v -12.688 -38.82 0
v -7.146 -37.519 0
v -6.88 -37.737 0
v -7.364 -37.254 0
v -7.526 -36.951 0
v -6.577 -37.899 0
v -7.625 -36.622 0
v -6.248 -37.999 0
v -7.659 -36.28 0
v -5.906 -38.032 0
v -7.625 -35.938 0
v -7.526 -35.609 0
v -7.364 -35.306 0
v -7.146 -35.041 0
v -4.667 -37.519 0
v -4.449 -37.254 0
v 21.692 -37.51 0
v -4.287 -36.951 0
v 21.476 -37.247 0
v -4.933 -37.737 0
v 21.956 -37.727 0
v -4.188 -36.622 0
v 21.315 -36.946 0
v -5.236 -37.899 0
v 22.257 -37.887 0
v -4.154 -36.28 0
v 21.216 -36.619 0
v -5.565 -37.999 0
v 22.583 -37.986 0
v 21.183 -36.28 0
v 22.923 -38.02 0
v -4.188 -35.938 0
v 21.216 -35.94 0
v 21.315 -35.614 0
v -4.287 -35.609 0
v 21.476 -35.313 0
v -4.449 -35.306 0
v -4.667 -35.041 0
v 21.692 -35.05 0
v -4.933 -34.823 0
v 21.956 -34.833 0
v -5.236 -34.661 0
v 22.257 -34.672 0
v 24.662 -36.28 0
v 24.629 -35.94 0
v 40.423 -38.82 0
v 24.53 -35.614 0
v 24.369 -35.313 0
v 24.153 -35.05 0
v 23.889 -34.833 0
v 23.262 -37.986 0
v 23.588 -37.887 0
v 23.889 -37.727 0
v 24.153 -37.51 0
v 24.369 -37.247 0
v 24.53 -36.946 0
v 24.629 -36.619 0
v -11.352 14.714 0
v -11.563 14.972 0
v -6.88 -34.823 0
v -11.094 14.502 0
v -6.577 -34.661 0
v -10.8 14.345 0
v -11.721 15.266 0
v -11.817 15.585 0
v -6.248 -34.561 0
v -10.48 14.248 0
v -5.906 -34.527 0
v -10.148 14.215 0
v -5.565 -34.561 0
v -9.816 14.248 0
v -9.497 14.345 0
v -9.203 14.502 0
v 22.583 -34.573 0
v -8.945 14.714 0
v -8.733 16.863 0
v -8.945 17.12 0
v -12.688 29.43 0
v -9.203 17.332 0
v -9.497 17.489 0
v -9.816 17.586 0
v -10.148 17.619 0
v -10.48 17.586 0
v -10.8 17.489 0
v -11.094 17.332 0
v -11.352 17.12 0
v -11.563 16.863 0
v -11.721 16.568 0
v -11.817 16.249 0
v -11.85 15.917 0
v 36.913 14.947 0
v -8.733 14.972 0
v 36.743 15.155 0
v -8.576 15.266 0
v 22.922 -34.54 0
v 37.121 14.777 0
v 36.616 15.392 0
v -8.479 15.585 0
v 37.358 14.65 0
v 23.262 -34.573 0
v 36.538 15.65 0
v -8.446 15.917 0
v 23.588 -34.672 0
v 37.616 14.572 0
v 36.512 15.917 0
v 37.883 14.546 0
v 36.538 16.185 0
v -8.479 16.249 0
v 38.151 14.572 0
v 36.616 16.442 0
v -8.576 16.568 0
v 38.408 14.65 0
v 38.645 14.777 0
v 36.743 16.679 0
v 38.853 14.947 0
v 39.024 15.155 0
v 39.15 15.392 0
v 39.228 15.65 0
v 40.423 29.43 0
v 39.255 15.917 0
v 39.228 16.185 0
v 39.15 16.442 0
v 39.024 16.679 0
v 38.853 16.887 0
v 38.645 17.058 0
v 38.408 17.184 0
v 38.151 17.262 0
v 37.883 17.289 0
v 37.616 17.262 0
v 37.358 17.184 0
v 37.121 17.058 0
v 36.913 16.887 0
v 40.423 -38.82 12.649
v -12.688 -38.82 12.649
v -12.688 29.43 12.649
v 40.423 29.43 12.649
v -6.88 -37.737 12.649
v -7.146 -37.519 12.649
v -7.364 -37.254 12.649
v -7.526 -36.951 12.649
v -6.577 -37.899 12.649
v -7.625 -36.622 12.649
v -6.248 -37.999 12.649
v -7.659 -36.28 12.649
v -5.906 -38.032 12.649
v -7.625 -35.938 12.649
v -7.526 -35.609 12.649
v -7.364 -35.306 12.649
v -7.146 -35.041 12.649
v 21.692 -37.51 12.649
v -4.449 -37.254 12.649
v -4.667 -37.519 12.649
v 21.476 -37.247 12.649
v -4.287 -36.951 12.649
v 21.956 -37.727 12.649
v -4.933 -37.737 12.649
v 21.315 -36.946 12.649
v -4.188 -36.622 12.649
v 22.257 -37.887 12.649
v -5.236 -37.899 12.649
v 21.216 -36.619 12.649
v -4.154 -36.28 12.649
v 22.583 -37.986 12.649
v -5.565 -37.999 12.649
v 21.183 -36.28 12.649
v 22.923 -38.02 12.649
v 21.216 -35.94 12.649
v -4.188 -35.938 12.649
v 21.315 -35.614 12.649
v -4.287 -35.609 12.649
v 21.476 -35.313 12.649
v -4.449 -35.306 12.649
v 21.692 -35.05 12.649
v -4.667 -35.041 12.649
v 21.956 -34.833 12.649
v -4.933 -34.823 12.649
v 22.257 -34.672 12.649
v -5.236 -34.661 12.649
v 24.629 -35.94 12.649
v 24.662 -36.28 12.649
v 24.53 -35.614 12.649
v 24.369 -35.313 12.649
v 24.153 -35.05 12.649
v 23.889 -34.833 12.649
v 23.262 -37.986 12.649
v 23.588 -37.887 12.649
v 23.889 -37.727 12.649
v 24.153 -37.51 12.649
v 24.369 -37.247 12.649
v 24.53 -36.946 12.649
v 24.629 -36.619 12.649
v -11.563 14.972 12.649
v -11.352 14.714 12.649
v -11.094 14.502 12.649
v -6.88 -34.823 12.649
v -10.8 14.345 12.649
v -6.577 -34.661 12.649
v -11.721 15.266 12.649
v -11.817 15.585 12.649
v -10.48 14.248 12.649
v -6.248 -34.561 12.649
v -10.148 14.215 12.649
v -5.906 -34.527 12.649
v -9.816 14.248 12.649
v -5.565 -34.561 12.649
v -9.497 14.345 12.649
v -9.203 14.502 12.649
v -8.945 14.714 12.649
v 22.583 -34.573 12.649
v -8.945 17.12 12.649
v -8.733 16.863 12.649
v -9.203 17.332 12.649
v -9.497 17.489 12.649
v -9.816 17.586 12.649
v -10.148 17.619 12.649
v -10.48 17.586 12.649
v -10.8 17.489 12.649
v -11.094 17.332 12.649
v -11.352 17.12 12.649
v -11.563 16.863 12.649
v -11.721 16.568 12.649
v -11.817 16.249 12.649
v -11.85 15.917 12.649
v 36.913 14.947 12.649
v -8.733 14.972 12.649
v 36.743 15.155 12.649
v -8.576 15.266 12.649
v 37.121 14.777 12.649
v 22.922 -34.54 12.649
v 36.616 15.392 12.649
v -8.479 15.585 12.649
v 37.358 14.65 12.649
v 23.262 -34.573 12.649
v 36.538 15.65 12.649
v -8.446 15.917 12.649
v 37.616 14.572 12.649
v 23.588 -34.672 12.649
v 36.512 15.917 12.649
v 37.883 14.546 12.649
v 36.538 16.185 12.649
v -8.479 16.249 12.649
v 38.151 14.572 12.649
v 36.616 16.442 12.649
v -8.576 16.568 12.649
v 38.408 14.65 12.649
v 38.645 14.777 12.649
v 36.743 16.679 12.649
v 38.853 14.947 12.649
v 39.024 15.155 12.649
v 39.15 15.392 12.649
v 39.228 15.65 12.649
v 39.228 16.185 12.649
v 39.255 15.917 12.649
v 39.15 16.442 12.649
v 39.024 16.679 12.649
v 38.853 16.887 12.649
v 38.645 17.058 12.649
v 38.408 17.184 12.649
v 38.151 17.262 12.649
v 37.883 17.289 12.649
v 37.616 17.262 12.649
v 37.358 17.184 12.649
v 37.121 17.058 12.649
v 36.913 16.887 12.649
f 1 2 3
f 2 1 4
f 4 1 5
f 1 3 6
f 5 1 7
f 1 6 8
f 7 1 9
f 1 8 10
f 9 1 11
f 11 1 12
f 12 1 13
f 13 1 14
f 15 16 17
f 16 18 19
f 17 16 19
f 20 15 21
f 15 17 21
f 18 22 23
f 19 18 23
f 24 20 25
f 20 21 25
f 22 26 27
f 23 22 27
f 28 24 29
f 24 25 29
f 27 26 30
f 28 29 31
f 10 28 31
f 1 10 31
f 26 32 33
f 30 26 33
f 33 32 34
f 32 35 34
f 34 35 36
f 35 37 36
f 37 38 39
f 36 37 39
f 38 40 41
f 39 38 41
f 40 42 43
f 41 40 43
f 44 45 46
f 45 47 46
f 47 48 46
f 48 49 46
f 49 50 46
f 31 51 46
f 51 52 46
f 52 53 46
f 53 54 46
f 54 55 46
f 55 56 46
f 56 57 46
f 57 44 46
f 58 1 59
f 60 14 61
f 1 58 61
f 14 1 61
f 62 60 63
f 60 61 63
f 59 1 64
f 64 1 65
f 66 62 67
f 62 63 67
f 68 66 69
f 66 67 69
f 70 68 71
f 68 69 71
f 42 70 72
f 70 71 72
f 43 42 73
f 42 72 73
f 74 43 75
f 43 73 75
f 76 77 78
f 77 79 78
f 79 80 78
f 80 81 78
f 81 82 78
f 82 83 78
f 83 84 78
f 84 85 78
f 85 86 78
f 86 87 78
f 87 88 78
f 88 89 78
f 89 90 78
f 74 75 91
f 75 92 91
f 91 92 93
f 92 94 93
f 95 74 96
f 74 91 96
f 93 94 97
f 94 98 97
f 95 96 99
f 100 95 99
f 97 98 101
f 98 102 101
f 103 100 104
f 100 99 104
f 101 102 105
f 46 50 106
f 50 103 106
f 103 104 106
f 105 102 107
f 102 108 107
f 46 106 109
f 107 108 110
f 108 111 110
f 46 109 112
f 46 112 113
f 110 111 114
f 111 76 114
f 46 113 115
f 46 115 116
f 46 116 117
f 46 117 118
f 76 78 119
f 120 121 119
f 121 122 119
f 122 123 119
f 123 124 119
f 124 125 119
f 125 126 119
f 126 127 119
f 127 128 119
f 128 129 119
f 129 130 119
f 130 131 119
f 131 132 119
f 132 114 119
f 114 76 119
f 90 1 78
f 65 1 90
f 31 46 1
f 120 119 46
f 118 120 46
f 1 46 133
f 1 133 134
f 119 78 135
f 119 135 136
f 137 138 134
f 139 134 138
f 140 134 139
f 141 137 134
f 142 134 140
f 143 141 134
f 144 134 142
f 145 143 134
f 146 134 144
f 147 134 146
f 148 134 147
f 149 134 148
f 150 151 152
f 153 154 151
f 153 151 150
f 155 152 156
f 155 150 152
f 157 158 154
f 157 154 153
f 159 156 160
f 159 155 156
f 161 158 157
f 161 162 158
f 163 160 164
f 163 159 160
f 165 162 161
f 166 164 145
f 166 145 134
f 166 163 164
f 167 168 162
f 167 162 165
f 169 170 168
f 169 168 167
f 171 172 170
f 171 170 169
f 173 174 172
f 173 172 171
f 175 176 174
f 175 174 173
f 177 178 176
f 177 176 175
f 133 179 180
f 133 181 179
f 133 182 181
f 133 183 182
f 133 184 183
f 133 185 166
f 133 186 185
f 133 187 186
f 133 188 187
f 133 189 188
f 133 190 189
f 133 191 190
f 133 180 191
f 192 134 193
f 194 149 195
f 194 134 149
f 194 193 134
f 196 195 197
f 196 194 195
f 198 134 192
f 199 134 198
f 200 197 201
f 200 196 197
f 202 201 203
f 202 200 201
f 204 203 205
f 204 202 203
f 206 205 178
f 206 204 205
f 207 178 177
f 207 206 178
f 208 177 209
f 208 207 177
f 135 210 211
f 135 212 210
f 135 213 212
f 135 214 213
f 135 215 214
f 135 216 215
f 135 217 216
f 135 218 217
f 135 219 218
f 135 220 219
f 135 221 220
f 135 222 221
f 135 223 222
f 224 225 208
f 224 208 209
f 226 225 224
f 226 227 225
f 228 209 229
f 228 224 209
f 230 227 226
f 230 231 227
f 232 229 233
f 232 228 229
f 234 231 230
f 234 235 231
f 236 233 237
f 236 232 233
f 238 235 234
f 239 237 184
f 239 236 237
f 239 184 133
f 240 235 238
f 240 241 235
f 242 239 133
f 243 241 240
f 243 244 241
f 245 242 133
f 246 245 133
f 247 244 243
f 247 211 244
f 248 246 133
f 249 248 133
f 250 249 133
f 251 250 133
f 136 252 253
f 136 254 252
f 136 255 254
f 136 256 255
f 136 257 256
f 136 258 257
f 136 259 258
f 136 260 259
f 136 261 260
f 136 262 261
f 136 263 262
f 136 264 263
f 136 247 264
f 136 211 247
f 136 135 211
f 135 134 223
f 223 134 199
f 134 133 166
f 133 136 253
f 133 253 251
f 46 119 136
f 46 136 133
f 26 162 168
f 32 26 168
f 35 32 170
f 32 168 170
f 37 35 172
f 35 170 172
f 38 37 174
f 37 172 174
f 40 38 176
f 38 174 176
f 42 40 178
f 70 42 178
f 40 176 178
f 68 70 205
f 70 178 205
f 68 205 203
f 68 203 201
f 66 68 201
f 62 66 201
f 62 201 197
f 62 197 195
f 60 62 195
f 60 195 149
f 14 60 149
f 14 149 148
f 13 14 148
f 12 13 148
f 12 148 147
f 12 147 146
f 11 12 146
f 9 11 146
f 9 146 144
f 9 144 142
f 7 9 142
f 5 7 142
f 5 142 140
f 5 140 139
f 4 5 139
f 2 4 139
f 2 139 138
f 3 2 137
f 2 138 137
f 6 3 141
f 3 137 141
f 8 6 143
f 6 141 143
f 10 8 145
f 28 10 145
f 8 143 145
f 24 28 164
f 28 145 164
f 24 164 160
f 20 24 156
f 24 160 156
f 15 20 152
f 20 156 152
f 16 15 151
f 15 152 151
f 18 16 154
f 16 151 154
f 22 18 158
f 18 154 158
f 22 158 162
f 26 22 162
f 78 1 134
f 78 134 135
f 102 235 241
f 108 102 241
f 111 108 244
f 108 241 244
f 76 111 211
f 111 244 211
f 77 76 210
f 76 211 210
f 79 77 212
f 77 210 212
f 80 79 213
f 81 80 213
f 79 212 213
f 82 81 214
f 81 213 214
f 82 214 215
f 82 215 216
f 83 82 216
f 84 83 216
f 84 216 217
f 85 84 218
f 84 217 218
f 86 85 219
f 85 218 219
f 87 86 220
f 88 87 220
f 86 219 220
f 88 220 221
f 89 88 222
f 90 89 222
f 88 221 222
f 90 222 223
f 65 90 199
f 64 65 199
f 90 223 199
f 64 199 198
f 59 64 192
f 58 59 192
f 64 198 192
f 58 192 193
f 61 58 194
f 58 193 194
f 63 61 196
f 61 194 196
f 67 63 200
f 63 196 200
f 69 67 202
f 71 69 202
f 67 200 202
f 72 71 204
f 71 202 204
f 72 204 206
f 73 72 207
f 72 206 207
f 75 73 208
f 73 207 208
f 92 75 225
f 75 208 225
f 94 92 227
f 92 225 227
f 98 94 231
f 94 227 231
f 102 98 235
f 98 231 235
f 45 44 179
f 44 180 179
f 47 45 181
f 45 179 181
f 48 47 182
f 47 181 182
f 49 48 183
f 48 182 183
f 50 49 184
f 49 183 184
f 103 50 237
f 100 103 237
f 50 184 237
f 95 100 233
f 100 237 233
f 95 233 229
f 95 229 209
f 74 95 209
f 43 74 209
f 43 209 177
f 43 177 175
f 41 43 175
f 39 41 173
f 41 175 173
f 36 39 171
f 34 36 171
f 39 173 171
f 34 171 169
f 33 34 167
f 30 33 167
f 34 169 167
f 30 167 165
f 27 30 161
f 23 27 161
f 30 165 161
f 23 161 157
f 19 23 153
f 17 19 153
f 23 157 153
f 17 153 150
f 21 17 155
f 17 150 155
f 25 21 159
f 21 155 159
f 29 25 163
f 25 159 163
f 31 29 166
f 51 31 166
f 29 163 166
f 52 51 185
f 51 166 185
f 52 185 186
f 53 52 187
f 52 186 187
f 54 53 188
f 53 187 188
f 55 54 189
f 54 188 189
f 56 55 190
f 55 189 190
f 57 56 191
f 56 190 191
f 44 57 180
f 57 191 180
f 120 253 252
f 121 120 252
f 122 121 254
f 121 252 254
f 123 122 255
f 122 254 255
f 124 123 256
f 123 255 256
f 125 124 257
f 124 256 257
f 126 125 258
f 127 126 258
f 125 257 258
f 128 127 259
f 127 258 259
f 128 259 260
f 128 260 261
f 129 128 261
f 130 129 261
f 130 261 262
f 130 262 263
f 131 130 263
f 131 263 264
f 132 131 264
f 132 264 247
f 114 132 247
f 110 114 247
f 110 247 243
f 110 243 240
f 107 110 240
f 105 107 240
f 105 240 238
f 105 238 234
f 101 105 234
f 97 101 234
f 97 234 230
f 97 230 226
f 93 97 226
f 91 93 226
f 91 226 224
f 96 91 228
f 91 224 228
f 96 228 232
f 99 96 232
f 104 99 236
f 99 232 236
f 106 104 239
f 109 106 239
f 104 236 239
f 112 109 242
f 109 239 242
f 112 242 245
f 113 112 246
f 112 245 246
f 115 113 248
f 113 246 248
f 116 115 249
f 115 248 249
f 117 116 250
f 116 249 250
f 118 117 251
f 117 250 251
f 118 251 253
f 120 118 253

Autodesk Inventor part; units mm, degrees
ref_plane "YZ Plane" through (0, 0, 0) normal (1, 0, 0) x (0, 1, 0)
ref_plane "XZ Plane" through (0, 0, 0) normal (0, 1, 0) x (-1, 0, 0)
ref_plane "XY Plane" through (0, 0, 0) normal (0, 0, 1) x (1, 0, 0)
sketch "Sketch1" plane through (0, 0, 0) normal (0, 0, 1) x (1, 0, 0)
  line L0 (-12.6883, 29.4299) -> (40.4231, 29.4299)
  line L1 (40.4231, 29.4299) -> (40.4231, -38.8199)
  line L2 (40.4231, -38.8199) -> (-12.6883, -38.8199)
  line L3 (-12.6883, -38.8199) -> (-12.6883, 29.4299)
  point P0 (0, 0)
  dimension "d0" = 68.2498
  dimension "d1" = 53.1114
extrude "Extrusion1" add sketch "Sketch1" along normal blind 12.6492
sketch "Sketch2" plane through (0, 0, 12.6492) normal (0, 0, 1) x (1, 0, 0)
  line L0 (40.4231, -38.8199) -> (40.4231, 29.4299) projected
  circle A0 centre (-5.9065, -36.2799) radius 1.7526
  line L1 (-12.6883, -38.8199) -> (-12.6883, 29.4299) projected
  circle A1 centre (-10.1483, 15.9171) radius 1.7018
  line L2 (40.4231, 29.4299) -> (-12.6883, 29.4299) projected
  circle A2 centre (37.8831, 15.9171) radius 1.3716
  line L3 (-12.6883, -38.8199) -> (40.4231, -38.8199) projected
  point P0 (0, 0)
  dimension "d6" = 6.7818
  dimension "d7" = 3.5052
  dimension "d8" = 13.5128
  dimension "d9" = 3.4036
  dimension "d10" = 2.7432
  dimension "d18" = 2.54
  dimension "d21" = 2.54
  dimension "d22" = 2.54
extrude "Extrusion2" cut sketch "Sketch2" against normal blind 12.7 contours A1
sketch "Sketch3" plane through (0, 0, 12.6492) normal (0, 0, 1) x (1, 0, 0)
  circle A0 centre (22.9225, -36.2799) radius 1.7399
  line L0 (40.4231, -38.8199) -> (40.4231, 29.4299) projected
  line L1 (-12.6883, -38.8199) -> (40.4231, -38.8199) projected
  point P0 (0, 0)
  dimension "d13" = 17.5006
  dimension "d14" = 3.4798
  dimension "d15" = 2.54
extrude "Extrusion3" cut sketch "Sketch3" against normal blind 12.7
sketch "Sketch4" plane through (0, 0, 12.6492) normal (0, 0, 1) x (1, 0, 0)
  point P0 (0, 0)
extrude "Extrusion4" cut sketch "Sketch2" against normal blind 12.7 contours A0
extrude "Extrusion5" cut sketch "Sketch2" against normal blind 12.7 contours A2
properties part number "arduino"
